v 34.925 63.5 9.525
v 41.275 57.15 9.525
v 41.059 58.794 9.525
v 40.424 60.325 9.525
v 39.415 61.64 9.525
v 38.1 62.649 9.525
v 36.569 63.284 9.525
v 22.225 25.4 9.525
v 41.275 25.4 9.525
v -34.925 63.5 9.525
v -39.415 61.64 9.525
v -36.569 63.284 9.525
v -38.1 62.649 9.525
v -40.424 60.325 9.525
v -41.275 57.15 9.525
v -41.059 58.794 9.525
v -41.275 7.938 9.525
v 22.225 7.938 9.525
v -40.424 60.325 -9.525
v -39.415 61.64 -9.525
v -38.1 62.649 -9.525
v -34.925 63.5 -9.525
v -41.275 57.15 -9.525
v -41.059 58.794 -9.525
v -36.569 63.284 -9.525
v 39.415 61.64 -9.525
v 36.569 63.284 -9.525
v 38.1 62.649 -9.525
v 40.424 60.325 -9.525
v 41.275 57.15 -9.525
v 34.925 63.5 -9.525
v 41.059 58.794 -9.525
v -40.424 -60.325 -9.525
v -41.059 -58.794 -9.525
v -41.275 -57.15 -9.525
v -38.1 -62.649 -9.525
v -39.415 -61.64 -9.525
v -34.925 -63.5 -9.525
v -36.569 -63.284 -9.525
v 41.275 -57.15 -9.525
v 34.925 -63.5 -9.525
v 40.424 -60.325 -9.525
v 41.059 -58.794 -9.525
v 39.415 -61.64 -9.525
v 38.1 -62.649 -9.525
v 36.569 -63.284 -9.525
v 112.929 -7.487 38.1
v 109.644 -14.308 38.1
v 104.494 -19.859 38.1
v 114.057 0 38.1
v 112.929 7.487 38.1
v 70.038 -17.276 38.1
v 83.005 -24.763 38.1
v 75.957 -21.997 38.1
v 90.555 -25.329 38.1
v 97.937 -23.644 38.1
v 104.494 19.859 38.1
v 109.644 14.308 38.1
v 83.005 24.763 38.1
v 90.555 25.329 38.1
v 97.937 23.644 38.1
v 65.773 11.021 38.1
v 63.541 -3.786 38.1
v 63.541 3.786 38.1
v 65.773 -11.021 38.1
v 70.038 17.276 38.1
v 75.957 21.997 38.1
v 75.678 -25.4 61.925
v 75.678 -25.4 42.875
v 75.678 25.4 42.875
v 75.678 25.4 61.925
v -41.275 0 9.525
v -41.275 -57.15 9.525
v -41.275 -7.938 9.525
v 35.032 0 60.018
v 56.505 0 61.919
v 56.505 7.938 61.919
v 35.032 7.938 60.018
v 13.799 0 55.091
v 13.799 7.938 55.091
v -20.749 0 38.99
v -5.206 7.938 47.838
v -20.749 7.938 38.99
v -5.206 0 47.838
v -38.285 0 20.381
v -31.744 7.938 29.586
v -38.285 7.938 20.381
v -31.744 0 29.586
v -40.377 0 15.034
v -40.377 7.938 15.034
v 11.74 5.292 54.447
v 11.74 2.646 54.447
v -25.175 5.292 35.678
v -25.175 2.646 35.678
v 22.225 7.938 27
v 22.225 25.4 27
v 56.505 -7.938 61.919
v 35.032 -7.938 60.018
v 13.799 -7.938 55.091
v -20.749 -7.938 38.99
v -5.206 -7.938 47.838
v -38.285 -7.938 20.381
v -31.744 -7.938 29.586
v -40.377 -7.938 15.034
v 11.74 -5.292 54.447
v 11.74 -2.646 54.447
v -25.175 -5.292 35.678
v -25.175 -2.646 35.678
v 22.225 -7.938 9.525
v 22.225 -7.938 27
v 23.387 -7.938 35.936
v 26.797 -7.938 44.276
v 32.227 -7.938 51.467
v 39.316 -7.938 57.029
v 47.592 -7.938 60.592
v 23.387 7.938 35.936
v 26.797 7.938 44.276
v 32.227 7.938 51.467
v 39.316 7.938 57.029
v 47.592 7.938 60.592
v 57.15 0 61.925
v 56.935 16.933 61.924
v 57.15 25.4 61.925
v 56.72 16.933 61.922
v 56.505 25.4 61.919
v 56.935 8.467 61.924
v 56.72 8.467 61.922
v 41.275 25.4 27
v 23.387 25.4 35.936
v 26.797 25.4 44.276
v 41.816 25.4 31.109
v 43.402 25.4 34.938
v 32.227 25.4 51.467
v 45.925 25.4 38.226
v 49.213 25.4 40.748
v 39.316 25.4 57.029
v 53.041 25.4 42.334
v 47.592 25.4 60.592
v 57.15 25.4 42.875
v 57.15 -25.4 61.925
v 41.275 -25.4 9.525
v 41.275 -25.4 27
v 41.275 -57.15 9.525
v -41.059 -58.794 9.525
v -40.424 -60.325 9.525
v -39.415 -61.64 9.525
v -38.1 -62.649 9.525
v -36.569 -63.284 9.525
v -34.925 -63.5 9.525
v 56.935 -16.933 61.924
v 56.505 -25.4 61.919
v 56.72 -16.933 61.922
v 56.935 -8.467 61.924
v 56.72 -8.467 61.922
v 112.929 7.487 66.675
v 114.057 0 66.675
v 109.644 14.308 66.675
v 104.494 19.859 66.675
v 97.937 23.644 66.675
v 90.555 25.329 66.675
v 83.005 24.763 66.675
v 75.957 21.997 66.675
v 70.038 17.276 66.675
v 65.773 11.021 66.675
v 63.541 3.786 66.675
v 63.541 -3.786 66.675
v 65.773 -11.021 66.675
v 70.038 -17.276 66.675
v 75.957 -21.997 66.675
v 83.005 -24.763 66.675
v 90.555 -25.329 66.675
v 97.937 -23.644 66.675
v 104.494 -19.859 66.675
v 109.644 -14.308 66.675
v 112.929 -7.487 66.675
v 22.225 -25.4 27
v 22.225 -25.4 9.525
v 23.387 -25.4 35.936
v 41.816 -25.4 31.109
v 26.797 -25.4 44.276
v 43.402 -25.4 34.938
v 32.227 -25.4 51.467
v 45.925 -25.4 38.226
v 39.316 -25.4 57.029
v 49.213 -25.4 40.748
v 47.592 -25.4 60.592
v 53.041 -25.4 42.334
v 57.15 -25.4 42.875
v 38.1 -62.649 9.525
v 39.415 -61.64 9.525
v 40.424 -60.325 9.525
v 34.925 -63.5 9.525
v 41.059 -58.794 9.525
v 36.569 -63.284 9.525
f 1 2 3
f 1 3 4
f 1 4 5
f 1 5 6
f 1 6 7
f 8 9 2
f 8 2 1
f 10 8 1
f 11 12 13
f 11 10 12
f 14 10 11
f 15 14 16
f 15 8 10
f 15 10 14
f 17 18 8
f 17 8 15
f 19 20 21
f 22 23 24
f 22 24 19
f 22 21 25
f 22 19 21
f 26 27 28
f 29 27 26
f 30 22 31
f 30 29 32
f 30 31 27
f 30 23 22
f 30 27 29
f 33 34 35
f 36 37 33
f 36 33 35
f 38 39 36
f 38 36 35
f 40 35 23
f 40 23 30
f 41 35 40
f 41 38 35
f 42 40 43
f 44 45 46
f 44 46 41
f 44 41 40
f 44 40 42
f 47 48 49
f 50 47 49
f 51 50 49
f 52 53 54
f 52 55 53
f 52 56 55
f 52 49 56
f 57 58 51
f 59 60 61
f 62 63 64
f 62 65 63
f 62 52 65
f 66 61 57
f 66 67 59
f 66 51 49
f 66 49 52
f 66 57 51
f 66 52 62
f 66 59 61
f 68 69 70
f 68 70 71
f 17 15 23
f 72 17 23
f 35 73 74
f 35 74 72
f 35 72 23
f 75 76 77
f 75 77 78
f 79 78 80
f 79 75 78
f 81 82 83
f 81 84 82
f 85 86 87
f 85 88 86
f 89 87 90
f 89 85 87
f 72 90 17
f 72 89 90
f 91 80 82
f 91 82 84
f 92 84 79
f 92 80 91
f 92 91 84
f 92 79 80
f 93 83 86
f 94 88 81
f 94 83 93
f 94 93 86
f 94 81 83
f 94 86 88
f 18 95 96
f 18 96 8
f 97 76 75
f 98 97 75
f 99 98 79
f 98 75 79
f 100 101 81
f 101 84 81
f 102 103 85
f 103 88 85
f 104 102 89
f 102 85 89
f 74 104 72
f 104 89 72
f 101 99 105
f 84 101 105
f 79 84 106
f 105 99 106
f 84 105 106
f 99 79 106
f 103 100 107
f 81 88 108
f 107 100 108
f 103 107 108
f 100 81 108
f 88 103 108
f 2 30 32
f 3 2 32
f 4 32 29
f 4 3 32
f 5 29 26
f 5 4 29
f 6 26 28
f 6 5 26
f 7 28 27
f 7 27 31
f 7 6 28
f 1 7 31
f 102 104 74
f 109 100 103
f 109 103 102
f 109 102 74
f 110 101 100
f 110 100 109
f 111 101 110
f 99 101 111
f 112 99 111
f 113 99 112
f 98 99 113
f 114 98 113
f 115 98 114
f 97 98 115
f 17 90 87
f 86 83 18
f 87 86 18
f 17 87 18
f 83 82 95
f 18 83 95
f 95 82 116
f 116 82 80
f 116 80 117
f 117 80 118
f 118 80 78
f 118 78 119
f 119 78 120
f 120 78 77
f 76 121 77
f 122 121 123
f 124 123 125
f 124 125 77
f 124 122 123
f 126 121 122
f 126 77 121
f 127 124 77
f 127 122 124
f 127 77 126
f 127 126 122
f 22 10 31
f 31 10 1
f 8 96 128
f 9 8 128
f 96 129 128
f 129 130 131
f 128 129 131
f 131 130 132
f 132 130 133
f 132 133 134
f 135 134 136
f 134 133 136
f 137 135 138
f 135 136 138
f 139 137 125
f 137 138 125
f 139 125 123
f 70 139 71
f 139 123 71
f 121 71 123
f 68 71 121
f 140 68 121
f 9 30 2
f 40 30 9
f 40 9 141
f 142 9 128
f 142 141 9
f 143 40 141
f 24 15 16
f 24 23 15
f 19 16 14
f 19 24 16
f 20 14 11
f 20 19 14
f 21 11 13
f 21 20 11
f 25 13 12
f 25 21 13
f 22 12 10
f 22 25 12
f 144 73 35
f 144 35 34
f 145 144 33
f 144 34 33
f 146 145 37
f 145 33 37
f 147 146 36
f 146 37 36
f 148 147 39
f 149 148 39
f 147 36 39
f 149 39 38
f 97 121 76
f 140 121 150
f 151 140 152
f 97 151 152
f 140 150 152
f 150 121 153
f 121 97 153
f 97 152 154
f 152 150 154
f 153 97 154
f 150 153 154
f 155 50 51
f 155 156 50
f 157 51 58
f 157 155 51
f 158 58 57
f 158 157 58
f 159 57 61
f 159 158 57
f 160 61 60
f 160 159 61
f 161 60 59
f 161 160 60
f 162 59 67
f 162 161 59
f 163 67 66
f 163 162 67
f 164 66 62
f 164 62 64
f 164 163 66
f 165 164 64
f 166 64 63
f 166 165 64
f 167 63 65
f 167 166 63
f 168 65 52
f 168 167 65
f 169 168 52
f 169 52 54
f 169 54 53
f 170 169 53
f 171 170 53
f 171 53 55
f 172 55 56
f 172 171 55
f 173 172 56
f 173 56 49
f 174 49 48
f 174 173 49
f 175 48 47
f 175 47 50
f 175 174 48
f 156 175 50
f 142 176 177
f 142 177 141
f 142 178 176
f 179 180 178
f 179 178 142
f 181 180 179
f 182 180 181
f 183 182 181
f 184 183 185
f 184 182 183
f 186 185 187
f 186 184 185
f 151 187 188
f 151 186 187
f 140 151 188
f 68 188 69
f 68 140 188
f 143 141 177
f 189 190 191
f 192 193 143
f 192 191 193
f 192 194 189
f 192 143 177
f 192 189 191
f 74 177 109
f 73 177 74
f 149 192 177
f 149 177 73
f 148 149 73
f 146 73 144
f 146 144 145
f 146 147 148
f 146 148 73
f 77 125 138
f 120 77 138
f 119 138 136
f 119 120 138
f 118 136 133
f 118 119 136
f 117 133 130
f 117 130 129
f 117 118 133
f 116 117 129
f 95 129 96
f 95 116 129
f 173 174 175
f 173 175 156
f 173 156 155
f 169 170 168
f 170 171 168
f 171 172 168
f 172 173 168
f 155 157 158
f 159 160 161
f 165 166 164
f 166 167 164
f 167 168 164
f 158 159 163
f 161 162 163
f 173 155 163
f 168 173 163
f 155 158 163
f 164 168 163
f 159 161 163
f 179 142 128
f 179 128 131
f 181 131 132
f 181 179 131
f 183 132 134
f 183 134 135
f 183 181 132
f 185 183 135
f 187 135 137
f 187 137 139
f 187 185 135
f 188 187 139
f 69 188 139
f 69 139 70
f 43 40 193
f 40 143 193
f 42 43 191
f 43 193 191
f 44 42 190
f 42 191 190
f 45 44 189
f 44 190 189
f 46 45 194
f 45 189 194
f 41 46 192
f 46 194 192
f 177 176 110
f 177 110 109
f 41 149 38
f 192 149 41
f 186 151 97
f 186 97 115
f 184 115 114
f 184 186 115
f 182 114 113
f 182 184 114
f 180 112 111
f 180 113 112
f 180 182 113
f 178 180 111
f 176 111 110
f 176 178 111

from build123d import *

# Parameters (mm, degrees)
F1_DEPTH = 63.5
F2_R     = 6.35
F0_W     = 25.4
F0_H     = 28.575
F4_DEPTH = 7.9375
F0_W_2   = 12.4209585713
F0_H_2   = 19.05
F5_DEPTH = 25.4


with BuildPart() as f1:
    # F0 (on Front) → F1 (new body, symmetric)
    with BuildSketch(Plane.XZ):
        Polygon((22.225, 9.525), (-41.275, 9.525), (-41.275, -9.525), (41.275, -9.525), (41.275, 9.525), align=None)
    extrude(amount=F1_DEPTH, both=True)

    # F2
    f2_edges = [f1.edges().sort_by_distance(p)[0] for p in [
        (41.275, -63.5, 0),
        (-41.275, -63.5, 0),
        (-41.275, 63.5, 0),
        (41.275, 63.5, 0),
    ]]
    fillet(f2_edges, radius=F2_R)

    # F0 (on Front) → F4 (join, symmetric)
    with BuildSketch(Plane.XZ):
        with BuildLine():
            add(Edge.make_bspline(
                [(56.5045744803, 61.9192356525), (12.1359940595, 61.3987338725), (-39.902945727, 38.0672359689), (-41.275, 9.525)],
                knots=[0.538528036, 0.538528036, 0.538528036, 0.538528036, 111.5045361635, 111.5045361635, 111.5045361635, 111.5045361635], degree=3))
            Line((-41.275, 9.525), (22.225, 9.525))
            Line((22.225, 9.525), (22.225, 27.0002))
            ThreePointArc((22.225, 27.0002), (32.2271479233, 51.4666478289), (56.5045744803, 61.9192356525))
        make_face()
    extrude(amount=F4_DEPTH, both=True)

    # F0 (on Front) → F5 (join, symmetric)
    with BuildSketch(Plane.XZ):
        with BuildLine():
            Line((22.225, 27.0002), (22.225, 9.525))
            Line((22.225, 9.525), (41.275, 9.525))
            Line((41.275, 9.525), (41.275, 27.0002))
            ThreePointArc((41.275, 27.0002), (45.9246798487, 38.2255201513), (57.15, 42.8752))
            Line((57.15, 42.8752), (63.257267818, 42.8752))
            Line((63.257267818, 42.8752), (63.257267818, 61.9252))
            Line((63.257267818, 61.9252), (57.15, 61.9252))
            add(Edge.make_bspline(
                [(57.15, 61.9252), (56.9350432615, 61.9237504809), (56.7198991989, 61.9217616945), (56.5045744803, 61.9192356525)],
                knots=[0, 0, 0, 0, 0.538528036, 0.538528036, 0.538528036, 0.538528036], degree=3))
            ThreePointArc((56.5045744803, 61.9192356525), (32.2271479233, 51.4666478289), (22.225, 27.0002))
        make_face()
        with Locations((69.4677471036, 52.4002)):
            Rectangle(F0_W_2, F0_H_2)
    extrude(amount=F5_DEPTH, both=True)


with BuildPart() as f3:
    # F0 (on Front) → F3 (revolve)
    with BuildSketch(Plane.XZ):
        with Locations((101.357267818, 52.3875)):
            Rectangle(F0_W, F0_H)
    revolve(axis=Axis((88.657267818, 0, 52.3875), (0, 0, 1)))


solid = Compound([f1.part, f3.part])
